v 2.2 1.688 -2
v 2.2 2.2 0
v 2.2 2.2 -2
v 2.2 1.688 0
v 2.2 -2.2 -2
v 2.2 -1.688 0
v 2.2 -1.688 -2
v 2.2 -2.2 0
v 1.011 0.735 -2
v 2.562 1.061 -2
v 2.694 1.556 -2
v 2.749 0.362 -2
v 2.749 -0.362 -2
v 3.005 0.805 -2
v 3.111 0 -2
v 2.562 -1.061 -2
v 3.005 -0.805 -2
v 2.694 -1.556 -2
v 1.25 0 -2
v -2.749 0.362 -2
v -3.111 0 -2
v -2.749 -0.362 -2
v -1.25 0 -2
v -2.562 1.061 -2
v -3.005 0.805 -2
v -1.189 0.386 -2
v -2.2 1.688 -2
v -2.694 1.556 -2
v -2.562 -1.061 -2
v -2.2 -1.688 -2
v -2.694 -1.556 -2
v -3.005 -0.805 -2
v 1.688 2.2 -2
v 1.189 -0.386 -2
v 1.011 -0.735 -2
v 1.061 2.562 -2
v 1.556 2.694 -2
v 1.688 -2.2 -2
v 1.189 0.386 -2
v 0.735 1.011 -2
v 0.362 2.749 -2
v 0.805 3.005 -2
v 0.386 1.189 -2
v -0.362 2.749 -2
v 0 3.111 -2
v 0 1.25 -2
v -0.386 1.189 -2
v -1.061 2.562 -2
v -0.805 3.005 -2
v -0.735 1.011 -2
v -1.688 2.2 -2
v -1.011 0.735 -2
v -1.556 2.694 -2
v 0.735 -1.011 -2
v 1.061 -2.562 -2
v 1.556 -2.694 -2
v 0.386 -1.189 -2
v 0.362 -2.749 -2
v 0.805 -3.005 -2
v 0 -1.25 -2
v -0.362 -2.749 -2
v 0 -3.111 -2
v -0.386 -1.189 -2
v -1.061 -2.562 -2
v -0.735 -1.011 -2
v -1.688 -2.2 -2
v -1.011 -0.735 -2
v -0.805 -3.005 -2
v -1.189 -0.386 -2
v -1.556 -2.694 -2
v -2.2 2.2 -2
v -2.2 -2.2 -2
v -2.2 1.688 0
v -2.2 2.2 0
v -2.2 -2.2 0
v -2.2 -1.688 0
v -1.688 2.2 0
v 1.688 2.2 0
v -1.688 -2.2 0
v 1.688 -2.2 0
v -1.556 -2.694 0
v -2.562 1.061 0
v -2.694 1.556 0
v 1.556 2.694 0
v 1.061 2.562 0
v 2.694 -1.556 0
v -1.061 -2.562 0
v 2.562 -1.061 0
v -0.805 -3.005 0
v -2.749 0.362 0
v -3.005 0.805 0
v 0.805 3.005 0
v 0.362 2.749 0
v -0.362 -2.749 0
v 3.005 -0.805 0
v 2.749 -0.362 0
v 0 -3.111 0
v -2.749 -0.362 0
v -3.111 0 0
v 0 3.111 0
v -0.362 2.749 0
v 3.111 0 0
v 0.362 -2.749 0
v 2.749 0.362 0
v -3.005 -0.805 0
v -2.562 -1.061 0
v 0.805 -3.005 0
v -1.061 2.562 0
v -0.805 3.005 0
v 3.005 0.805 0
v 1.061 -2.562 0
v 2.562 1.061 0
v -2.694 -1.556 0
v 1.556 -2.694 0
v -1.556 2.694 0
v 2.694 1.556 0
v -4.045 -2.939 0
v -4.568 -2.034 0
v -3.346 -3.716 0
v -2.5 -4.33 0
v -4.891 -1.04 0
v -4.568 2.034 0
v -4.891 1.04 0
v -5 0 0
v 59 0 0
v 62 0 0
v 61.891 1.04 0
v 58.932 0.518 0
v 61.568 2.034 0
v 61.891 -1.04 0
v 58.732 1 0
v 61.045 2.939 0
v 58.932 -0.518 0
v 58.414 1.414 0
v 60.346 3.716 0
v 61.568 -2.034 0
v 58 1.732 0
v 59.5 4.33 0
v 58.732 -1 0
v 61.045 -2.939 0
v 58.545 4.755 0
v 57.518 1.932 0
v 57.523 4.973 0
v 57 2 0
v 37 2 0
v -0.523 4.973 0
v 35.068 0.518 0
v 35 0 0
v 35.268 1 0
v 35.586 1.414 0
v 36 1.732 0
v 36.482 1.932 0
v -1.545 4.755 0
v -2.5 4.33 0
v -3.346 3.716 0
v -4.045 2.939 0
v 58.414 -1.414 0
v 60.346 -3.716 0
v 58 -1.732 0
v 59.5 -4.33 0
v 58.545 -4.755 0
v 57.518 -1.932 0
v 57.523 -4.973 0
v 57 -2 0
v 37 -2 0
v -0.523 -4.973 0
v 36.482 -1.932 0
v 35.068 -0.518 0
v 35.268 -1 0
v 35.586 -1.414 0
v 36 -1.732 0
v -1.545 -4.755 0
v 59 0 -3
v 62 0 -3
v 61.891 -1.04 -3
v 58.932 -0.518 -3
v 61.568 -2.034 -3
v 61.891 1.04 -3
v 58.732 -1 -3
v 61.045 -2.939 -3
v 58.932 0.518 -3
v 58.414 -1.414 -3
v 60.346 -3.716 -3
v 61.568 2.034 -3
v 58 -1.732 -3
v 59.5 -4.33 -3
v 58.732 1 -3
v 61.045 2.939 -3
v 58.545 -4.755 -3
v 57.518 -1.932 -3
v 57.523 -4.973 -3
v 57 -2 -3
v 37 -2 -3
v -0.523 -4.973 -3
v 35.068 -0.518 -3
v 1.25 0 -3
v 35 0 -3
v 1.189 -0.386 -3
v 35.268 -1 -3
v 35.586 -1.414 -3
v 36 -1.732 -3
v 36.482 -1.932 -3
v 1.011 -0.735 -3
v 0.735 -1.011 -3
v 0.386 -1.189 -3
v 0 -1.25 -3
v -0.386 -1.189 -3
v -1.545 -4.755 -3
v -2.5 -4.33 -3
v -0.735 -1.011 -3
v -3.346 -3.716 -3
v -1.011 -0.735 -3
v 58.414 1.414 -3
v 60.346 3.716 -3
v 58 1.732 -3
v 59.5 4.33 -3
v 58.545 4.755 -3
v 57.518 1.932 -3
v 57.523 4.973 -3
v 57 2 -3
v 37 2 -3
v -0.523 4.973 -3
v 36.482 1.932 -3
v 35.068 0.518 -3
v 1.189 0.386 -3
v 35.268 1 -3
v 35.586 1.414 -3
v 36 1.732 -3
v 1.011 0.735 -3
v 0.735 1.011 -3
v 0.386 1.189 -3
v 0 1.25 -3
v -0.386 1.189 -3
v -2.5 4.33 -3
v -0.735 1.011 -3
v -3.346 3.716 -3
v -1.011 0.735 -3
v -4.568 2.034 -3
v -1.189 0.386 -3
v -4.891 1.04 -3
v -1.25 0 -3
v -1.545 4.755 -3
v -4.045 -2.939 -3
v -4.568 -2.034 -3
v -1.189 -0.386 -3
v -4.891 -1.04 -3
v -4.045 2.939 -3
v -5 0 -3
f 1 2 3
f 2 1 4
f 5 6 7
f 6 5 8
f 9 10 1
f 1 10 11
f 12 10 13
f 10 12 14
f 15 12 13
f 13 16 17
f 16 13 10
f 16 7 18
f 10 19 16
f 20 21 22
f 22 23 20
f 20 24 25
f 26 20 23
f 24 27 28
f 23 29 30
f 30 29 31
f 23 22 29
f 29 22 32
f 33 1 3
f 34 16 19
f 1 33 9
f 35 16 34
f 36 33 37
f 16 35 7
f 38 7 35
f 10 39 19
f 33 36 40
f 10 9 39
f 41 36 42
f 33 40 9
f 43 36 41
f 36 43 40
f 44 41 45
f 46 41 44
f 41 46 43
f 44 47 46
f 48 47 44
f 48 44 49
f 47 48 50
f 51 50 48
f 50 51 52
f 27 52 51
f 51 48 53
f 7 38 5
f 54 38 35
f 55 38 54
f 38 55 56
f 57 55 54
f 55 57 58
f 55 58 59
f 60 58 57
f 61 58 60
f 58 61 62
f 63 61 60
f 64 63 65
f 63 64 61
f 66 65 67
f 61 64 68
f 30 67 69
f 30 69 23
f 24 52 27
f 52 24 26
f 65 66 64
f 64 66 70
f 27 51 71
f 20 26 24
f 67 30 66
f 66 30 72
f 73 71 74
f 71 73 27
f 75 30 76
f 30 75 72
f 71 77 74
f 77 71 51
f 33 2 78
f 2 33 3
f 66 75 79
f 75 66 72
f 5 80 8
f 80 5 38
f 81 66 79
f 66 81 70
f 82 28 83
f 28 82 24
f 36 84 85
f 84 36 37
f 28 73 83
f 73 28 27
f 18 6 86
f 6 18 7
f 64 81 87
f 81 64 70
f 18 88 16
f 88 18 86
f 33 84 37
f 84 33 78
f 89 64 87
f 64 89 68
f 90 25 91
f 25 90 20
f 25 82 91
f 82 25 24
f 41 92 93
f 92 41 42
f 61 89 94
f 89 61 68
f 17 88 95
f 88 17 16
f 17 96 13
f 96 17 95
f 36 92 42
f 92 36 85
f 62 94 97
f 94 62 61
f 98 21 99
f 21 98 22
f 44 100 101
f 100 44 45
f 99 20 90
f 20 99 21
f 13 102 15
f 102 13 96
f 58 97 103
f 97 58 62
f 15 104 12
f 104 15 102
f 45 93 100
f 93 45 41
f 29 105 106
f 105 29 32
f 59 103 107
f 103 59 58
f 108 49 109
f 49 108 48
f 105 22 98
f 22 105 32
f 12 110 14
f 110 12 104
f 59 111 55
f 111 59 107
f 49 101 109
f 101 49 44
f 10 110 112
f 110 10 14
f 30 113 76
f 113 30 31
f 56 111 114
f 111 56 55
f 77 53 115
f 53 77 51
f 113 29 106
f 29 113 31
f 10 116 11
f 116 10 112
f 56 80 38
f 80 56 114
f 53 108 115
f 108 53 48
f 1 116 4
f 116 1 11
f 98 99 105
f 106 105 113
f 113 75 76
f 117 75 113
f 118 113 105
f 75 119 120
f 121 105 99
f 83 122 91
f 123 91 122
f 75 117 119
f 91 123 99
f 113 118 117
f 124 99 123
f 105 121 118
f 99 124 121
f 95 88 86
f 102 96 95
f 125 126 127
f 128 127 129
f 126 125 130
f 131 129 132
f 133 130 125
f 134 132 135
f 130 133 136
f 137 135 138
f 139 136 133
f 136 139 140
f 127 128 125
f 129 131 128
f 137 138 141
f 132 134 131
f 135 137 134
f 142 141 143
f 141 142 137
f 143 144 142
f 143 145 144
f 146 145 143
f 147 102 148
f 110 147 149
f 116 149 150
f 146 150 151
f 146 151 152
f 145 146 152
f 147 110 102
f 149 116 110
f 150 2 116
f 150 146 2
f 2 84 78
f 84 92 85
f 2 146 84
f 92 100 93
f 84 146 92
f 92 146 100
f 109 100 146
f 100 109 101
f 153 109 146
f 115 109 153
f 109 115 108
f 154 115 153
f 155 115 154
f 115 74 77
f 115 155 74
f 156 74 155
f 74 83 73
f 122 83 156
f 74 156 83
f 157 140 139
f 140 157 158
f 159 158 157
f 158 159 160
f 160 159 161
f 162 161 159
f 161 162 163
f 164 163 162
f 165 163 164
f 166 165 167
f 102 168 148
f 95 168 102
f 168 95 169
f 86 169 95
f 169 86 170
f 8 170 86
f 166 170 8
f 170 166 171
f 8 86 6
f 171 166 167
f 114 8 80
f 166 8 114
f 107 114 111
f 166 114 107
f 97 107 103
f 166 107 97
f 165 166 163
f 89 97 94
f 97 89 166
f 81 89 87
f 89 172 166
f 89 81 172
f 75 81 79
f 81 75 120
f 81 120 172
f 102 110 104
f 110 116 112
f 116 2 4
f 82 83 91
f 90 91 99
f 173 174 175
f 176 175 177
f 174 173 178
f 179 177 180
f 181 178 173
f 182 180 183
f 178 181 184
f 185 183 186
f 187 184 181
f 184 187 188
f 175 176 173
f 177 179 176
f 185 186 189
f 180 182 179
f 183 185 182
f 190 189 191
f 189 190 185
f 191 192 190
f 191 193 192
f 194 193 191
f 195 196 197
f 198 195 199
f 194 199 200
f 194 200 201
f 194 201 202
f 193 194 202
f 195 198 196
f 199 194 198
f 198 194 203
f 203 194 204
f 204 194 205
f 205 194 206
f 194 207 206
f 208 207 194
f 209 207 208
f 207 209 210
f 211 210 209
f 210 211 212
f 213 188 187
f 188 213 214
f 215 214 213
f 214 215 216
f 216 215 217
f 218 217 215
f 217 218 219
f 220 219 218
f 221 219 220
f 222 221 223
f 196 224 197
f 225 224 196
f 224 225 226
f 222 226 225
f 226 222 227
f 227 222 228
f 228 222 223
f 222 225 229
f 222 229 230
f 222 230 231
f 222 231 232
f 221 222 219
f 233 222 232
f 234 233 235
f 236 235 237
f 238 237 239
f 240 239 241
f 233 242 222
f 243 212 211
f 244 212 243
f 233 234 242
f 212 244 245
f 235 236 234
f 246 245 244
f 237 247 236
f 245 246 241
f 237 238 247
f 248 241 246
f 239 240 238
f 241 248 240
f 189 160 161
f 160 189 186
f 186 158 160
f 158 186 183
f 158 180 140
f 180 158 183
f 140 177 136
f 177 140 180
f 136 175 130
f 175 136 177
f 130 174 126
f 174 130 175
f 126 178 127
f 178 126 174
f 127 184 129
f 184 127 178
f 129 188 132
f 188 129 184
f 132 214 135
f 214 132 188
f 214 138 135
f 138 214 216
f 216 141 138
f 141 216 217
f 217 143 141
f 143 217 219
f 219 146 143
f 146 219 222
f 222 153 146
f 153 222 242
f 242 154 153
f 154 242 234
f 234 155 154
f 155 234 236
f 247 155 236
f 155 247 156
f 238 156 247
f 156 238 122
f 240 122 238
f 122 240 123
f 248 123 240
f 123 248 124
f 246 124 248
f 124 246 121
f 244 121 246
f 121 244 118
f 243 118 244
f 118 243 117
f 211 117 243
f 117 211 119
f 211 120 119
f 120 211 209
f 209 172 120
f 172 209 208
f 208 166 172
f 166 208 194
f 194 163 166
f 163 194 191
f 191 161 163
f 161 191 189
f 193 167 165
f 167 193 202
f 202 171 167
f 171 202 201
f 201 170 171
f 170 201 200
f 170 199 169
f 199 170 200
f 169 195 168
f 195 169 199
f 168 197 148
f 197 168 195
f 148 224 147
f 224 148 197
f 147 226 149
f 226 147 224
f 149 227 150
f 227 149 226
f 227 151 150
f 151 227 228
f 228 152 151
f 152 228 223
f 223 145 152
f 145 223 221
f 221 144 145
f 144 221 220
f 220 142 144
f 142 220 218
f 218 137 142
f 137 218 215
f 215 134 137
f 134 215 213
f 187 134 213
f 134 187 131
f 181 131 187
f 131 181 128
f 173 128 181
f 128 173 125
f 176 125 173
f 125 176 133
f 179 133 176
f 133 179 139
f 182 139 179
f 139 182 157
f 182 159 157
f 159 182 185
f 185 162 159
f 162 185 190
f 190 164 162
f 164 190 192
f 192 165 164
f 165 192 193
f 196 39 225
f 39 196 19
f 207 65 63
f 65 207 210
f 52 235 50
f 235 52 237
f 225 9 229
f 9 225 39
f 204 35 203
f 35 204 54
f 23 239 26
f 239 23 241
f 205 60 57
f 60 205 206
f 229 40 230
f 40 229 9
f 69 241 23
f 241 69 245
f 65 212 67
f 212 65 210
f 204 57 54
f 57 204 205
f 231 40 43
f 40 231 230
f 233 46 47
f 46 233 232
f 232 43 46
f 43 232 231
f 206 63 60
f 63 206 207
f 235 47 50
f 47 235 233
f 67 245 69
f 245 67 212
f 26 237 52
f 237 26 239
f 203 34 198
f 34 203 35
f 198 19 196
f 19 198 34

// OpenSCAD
hoseid=34;//2.5*25.4-4;
hoselip=10;
thick=4;
part="sarm"; // [all:Preview All,all2:Preview All (disected),top:Top Section,bottom:Bottom Section,bottom2:Bottom Port,tongue:Tongue,sarm:Servo Arm]
tyoff=10;
txoff=12;
addmount=1;
addservo=1;
anglemin=-31;
anglemax=31;
prevopen=0.5;

topy=hoseid*2+tyoff+20;
if(part=="all") {
  
  topgate();
  translate([0,prevopen*(hoseid+3.5),0]) tongue();
  bottomgate();
  bottomport();
}
else if(part=="all2")
{
  translate([0,0,12]) topgate();
  translate([0,prevopen*(hoseid+3.5),8]) tongue();
  translate([0,0,2]) bottomgate();
  translate([0,0,-2]) bottomport();
}
else if(part=="tongue")
  tongue();
else if(part=="top")
  topgate();
else if(part=="bottom")
  bottomgate();
else if(part=="bottom2") {
  mirror([0,0,1]) bottomport();
}
else if(part=="sarm")
  mirror([0,0,1]) servo_arm();
module tongue() {
  translate([hoseid/2+txoff,hoseid/2+tyoff,3.5])
  {
    cylinder(d=hoseid+7,h=3.5,$fn=hoseid);
    translate([hoseid/-2-3.5,0]) cube([hoseid+7,hoseid/2+12,3.5]);
    translate([hoseid/-2+1,hoseid/2,0]) {
      difference() {
        union(){
          cube([hoseid-2,hoseid+24,3.5]);
          if(addservo)
            translate([hoseid/2-1,hoseid+25]) cylinder(d=10,h=3.5,$fn=40);
        }
        if(addservo)
          translate([hoseid/2-1,hoseid+25,-1]) cylinder(d=3,h=5,$fn=20);
      }
      if(!addservo)
        translate([0,hoseid+21]) cube([hoseid-2,3,10]);
    }
  } 
}
module topgate() {
  intersection(){
    fullgate();
    translate([0,0,7]) cube([hoseid+txoff*2,hoseid*2+20+tyoff,hoselip+23]);
  }
}
module bottomgate() {
  intersection(){
    difference() {
      fullgate();
      *translate([hoseid/2+20,hoseid/2+20]) for(r=[0:45:360])
        rotate([0,0,r]) translate([hoseid/2+8,0,-.01]) cylinder(d=3,h=11,$fn=20);
    }
    translate([0,0,0]) cube([hoseid+40,hoseid*2+40,6.99]);
  }
  if(addservo)
  {
    translate([-23,topy-31+hoseid/2]) {  
        linear_extrude(7,convexity=5) polygon([[-8,20],[-8,40],[0,56],[0,0],[24,0],[24,-hoseid/2],[-2,0]]);
      translate([24,14,0]) cube([6,42,7]);
      difference() {
        cube([24,56,7]);
        translate([1.8,7.8,-1]) cube([20.4,40.4,9]);
        for(x=[6.5,17.5],y=[3.75,52.25])
          translate([x,y,-1]) cylinder(d=3,h=9,$fn=20);
      }
      if(part=="all"||part=="all2")
      {
        #translate([22,48,9.6])
          rotate([0,180,90]) servo();
        translate([12,38,10]) rotate([0,0,anglemin+prevopen*(anglemax-anglemin)]) servo_arm();
      }
    }
  }
}
module servo_arm() {
  difference() {
    linear_extrude(3,convexity=3) {
      difference() {
        hull() {
          circle(d=10,$fn=30);
          translate([hoseid/2+40,0]) circle(d=10,$fn=30);
        }
        hull() {
          translate([hoseid/2+20,0]) circle(d=4,$fn=24);
          translate([hoseid/2+40,0]) circle(d=4,$fn=24);
        }
      }
    }
    translate([0,0,-1]) {
      *cylinder(d=6,h=3,$fn=20);
      for(r=[0:15:360]) rotate([0,0,r]) translate([-2.2,-2.2]) cube([4.4,4.4,3]);
    }
    cylinder(d=2.5,h=4,$fn=20);
  }
}
module bottomport() {
  intersection(){
    fullgate();
    translate([0,0,-hoselip-44]) cube([hoseid+40,hoseid+40,hoselip+43.99]);
  }
}
module fullgate() {
difference() {
  union() {
    if(addmount)
    difference(){
      cube([hoseid+txoff*2,4,38]);
      for(x=[8,hoseid+txoff*2-8]) translate([x,-1,30]) rotate([-90,0]) cylinder(d=4,h=10,$fn=30);
    }
    cube([hoseid+txoff*2,hoseid*2+tyoff+20,10]);
    translate([hoseid/2+txoff,hoseid/2+tyoff,-30]) mirror([0,0,1]) rotate([180,0]) union() {
      translate([0,0,-18]) base_male(35.5);
      translate([0,0,2]) difference() {
        union() {
          cylinder(d=32.5,h=20,$fn=80);
          translate([0,0,20]) cylinder(d1=32.5,d2=40,h=6,$fn=80);
        }
        translate([0,0,-.01]) cylinder(d=27.5,h=20.02,$fn=80);
        translate([0,0,19.98]) cylinder(d1=27.5,d2=35,h=5.04,$fn=80);
      }
      *translate([0,0,20]) difference() {
        cylinder(d1=32,d2=54,h=30,$fn=80);
        translate([0,0,-.01]) cylinder(d1=28,d2=50,h=30.02,$fn=80);
      }
    }
    translate([hoseid/2+txoff,hoseid/2+tyoff,10]) cylinder(d=hoseid+thick,h=hoselip,$fn=100);
    translate([hoseid/2+txoff,hoseid/2+tyoff,-3]) cylinder(d=hoseid+10,h=3,$fn=100);
  }
    for(x=[4,hoseid+txoff*2-4],y=[8,hoseid+tyoff+4,hoseid*2+tyoff+14])
      translate([x,y,-1]) cylinder(d=3,h=12,$fn=20);
    translate([hoseid/2+txoff,hoseid/2+tyoff]) {
      translate([0,0,-3.01]) cylinder(d=hoseid,$fn=100,h=hoselip*2+17);
      translate([0,0,3]) cylinder(d=hoseid+8,h=4,$fn=hoseid);
    }
  translate([txoff-4,hoseid/2+tyoff,3]) cube([hoseid+8,hoseid*2+tyoff+10,4]);
}
  translate([hoseid/2+txoff,0]) for(m=[0,1]) mirror([m,0]) translate([-hoseid/2-txoff,0]) translate([0,hoseid*2+16+tyoff]) cube([txoff,4,10]);
}

module servo(rgstock=0) {
  *%import("Servo13.stl");
  translate([rgstock?-2.5:0,0]) {
  if(rgstock) {
    translate([10,10,-5]) cylinder(d=6,h=38,$fn=20);
    translate([10,10,37]) difference() {
      translate([0,0,-38.5]) cylinder(d=12,d2=11.75,h=40.1,$fn=50);
      translate([0,0,-.01]) cylinder(d=6,h=2,$fn=30);
    }
  }
  cube([40,20,37]);
  translate([10,10,-2]) cylinder(d=6,h=20,$fn=20);
  if(!rgstock) translate([-6.25,0,10]) difference() {
    cube([52.5,20,2.3]);
    for(x=[2,50.5],y=[4.5,15.5])
      translate([x,y,-.01]) cylinder(d=4.5,h=3,$fn=30);
  }
  if(rgstock) {
    difference() {
      mirror_zoffset(19.15) {
        difference() { union() {
            translate([40,-5,8.15]) cube([5,30,1.25]);
            mirror_yoffset(10) translate([40,-1,9.4]) cube([5,7,1.25]);
          }
          mirror_yoffset(10) translate([42.5,2.5,9.4]) { cylinder(d=4.5,h=2,$fn=6);
            translate([0,0,-5]) cylinder(d=2.1,h=10,$fn=30);
            translate([0,-2]) cube([2.51,4,3]);
          }
        }
        mirror_yoffset(10) 
        translate([0,-4.97,8.15]) difference() {
          union(){
            cube([40,5,1.25]);
            translate([0,0,1.25]) {
              cube([6,5,1.25]);
              translate([14.1,0])
                cube([11.85,5,1.25]);
              translate([34,0])
                cube([6.94,5,1.25]);
            }
          }
          for(x=[2.5,17.5,22.5,37.5])
            translate([x,2.5,1.25]) {
              rotate([0,0,90])
                cylinder(d=4.5,h=2,$fn=6);
              translate([-2,-2.51]) cube([4,2.5,3]);
              translate([0,0,-5]) cylinder(d=2.1,h=10,$fn=30);
            }
        }
      }
      mirror_yoffset(10) mirror_zoffset(20) mirror_xoffset(21) translate([-3,0,7]) rotate([0,0,-135]) cube(10);
    }
  }
  }
}

module mirrory(off=0)
{
  translate([0,off/2]) for(m=[0,1]) mirror([0,m]) translate([0,off*-.5]) children();
}



module ring(od,id,h)
{
  difference() {
    cylinder(d=od,h=h,$fn=od*2);
    translate([0,0,-.01]) cylinder(d=id,h=h+.02,$fn=id*2);
  }
}
module ring2(od1,od2,t,h)
{
  difference() {
    cylinder(d1=od1,d2=od2,h=h,$fn=od1*2);
    translate([0,0,-.01]) cylinder(d1=od1-t*2,d2=od2-t*2,h=h+.02,$fn=(od1-t*2)*2);
  }
}
module base_male(bd=35) {
  difference() {
    //ring2(bd,bd,4,20);
    //translate([0,0,-.01]) ring2(bd+.5,bd+2,1,1);
    //*
    cylinder(d=bd-.02,h=19.98,$fn=60);
    translate([0,0,-.01]) base_female(bd);
    translate([0,0,-.01]) cylinder(d=bd-8,h=20,$fn=56);
    translate([0,0,9.98]) ring(od=bd+2,id=bd-3,h=10.02);
    *translate([0,0,-.01]) ring2(bd-3,bd-1,1,2);
    //*/
  }
}
module base_female(bd=36.5) {
  difference() {
    cylinder(d=bd,h=10,$fn=60);
    translate([0,0,-.01]) cylinder(d=bd-3,h=3.02,$fn=50);
    translate([0,0,3]) cylinder(d1=bd-3,d2=bd-5,h=1.01,$fn=50);
    translate([0,0,4]) cylinder(d=bd-5,h=4.01,$fn=50);
    translate([0,0,8]) cylinder(d1=bd-5,d2=bd-3,h=1.01,$fn=50);
    translate([0,0,9]) cylinder(d=bd-3,h=1.01,$fn=50);
  }
}


module rounded_rect(w,h,r) {
  translate([r,r]) circle(d=r*2,$fn=30);
  translate([r,h-r]) circle(d=r*2,$fn=30);
  translate([w-r,h-r]) circle(d=r*2,$fn=30);
  translate([w-r,r]) circle(d=r*2,$fn=30);
  translate([r,0]) square([w-r*2,h]);
  translate([0,r]) square([r,h-r*2]);
  translate([w-r,r]) square([r,h-r*2]);
}
module rounded_cube(dims,rsides=2,rvert=0)
{
  w=dims[0];
  h=dims[1];
  d=dims[2];
  if(rvert==0)
  {
    linear_extrude(d) rounded_rect(w,h,rsides);
  } else {
    translate([rsides,rsides,rvert]) scale([1,1,rvert/rsides]) minkowski() {
      cube([w-rsides*2,h-rsides*2,(d-rvert*2)/(rvert/rsides)]);
      sphere(rsides,$fn=30);
    }
  }
}
